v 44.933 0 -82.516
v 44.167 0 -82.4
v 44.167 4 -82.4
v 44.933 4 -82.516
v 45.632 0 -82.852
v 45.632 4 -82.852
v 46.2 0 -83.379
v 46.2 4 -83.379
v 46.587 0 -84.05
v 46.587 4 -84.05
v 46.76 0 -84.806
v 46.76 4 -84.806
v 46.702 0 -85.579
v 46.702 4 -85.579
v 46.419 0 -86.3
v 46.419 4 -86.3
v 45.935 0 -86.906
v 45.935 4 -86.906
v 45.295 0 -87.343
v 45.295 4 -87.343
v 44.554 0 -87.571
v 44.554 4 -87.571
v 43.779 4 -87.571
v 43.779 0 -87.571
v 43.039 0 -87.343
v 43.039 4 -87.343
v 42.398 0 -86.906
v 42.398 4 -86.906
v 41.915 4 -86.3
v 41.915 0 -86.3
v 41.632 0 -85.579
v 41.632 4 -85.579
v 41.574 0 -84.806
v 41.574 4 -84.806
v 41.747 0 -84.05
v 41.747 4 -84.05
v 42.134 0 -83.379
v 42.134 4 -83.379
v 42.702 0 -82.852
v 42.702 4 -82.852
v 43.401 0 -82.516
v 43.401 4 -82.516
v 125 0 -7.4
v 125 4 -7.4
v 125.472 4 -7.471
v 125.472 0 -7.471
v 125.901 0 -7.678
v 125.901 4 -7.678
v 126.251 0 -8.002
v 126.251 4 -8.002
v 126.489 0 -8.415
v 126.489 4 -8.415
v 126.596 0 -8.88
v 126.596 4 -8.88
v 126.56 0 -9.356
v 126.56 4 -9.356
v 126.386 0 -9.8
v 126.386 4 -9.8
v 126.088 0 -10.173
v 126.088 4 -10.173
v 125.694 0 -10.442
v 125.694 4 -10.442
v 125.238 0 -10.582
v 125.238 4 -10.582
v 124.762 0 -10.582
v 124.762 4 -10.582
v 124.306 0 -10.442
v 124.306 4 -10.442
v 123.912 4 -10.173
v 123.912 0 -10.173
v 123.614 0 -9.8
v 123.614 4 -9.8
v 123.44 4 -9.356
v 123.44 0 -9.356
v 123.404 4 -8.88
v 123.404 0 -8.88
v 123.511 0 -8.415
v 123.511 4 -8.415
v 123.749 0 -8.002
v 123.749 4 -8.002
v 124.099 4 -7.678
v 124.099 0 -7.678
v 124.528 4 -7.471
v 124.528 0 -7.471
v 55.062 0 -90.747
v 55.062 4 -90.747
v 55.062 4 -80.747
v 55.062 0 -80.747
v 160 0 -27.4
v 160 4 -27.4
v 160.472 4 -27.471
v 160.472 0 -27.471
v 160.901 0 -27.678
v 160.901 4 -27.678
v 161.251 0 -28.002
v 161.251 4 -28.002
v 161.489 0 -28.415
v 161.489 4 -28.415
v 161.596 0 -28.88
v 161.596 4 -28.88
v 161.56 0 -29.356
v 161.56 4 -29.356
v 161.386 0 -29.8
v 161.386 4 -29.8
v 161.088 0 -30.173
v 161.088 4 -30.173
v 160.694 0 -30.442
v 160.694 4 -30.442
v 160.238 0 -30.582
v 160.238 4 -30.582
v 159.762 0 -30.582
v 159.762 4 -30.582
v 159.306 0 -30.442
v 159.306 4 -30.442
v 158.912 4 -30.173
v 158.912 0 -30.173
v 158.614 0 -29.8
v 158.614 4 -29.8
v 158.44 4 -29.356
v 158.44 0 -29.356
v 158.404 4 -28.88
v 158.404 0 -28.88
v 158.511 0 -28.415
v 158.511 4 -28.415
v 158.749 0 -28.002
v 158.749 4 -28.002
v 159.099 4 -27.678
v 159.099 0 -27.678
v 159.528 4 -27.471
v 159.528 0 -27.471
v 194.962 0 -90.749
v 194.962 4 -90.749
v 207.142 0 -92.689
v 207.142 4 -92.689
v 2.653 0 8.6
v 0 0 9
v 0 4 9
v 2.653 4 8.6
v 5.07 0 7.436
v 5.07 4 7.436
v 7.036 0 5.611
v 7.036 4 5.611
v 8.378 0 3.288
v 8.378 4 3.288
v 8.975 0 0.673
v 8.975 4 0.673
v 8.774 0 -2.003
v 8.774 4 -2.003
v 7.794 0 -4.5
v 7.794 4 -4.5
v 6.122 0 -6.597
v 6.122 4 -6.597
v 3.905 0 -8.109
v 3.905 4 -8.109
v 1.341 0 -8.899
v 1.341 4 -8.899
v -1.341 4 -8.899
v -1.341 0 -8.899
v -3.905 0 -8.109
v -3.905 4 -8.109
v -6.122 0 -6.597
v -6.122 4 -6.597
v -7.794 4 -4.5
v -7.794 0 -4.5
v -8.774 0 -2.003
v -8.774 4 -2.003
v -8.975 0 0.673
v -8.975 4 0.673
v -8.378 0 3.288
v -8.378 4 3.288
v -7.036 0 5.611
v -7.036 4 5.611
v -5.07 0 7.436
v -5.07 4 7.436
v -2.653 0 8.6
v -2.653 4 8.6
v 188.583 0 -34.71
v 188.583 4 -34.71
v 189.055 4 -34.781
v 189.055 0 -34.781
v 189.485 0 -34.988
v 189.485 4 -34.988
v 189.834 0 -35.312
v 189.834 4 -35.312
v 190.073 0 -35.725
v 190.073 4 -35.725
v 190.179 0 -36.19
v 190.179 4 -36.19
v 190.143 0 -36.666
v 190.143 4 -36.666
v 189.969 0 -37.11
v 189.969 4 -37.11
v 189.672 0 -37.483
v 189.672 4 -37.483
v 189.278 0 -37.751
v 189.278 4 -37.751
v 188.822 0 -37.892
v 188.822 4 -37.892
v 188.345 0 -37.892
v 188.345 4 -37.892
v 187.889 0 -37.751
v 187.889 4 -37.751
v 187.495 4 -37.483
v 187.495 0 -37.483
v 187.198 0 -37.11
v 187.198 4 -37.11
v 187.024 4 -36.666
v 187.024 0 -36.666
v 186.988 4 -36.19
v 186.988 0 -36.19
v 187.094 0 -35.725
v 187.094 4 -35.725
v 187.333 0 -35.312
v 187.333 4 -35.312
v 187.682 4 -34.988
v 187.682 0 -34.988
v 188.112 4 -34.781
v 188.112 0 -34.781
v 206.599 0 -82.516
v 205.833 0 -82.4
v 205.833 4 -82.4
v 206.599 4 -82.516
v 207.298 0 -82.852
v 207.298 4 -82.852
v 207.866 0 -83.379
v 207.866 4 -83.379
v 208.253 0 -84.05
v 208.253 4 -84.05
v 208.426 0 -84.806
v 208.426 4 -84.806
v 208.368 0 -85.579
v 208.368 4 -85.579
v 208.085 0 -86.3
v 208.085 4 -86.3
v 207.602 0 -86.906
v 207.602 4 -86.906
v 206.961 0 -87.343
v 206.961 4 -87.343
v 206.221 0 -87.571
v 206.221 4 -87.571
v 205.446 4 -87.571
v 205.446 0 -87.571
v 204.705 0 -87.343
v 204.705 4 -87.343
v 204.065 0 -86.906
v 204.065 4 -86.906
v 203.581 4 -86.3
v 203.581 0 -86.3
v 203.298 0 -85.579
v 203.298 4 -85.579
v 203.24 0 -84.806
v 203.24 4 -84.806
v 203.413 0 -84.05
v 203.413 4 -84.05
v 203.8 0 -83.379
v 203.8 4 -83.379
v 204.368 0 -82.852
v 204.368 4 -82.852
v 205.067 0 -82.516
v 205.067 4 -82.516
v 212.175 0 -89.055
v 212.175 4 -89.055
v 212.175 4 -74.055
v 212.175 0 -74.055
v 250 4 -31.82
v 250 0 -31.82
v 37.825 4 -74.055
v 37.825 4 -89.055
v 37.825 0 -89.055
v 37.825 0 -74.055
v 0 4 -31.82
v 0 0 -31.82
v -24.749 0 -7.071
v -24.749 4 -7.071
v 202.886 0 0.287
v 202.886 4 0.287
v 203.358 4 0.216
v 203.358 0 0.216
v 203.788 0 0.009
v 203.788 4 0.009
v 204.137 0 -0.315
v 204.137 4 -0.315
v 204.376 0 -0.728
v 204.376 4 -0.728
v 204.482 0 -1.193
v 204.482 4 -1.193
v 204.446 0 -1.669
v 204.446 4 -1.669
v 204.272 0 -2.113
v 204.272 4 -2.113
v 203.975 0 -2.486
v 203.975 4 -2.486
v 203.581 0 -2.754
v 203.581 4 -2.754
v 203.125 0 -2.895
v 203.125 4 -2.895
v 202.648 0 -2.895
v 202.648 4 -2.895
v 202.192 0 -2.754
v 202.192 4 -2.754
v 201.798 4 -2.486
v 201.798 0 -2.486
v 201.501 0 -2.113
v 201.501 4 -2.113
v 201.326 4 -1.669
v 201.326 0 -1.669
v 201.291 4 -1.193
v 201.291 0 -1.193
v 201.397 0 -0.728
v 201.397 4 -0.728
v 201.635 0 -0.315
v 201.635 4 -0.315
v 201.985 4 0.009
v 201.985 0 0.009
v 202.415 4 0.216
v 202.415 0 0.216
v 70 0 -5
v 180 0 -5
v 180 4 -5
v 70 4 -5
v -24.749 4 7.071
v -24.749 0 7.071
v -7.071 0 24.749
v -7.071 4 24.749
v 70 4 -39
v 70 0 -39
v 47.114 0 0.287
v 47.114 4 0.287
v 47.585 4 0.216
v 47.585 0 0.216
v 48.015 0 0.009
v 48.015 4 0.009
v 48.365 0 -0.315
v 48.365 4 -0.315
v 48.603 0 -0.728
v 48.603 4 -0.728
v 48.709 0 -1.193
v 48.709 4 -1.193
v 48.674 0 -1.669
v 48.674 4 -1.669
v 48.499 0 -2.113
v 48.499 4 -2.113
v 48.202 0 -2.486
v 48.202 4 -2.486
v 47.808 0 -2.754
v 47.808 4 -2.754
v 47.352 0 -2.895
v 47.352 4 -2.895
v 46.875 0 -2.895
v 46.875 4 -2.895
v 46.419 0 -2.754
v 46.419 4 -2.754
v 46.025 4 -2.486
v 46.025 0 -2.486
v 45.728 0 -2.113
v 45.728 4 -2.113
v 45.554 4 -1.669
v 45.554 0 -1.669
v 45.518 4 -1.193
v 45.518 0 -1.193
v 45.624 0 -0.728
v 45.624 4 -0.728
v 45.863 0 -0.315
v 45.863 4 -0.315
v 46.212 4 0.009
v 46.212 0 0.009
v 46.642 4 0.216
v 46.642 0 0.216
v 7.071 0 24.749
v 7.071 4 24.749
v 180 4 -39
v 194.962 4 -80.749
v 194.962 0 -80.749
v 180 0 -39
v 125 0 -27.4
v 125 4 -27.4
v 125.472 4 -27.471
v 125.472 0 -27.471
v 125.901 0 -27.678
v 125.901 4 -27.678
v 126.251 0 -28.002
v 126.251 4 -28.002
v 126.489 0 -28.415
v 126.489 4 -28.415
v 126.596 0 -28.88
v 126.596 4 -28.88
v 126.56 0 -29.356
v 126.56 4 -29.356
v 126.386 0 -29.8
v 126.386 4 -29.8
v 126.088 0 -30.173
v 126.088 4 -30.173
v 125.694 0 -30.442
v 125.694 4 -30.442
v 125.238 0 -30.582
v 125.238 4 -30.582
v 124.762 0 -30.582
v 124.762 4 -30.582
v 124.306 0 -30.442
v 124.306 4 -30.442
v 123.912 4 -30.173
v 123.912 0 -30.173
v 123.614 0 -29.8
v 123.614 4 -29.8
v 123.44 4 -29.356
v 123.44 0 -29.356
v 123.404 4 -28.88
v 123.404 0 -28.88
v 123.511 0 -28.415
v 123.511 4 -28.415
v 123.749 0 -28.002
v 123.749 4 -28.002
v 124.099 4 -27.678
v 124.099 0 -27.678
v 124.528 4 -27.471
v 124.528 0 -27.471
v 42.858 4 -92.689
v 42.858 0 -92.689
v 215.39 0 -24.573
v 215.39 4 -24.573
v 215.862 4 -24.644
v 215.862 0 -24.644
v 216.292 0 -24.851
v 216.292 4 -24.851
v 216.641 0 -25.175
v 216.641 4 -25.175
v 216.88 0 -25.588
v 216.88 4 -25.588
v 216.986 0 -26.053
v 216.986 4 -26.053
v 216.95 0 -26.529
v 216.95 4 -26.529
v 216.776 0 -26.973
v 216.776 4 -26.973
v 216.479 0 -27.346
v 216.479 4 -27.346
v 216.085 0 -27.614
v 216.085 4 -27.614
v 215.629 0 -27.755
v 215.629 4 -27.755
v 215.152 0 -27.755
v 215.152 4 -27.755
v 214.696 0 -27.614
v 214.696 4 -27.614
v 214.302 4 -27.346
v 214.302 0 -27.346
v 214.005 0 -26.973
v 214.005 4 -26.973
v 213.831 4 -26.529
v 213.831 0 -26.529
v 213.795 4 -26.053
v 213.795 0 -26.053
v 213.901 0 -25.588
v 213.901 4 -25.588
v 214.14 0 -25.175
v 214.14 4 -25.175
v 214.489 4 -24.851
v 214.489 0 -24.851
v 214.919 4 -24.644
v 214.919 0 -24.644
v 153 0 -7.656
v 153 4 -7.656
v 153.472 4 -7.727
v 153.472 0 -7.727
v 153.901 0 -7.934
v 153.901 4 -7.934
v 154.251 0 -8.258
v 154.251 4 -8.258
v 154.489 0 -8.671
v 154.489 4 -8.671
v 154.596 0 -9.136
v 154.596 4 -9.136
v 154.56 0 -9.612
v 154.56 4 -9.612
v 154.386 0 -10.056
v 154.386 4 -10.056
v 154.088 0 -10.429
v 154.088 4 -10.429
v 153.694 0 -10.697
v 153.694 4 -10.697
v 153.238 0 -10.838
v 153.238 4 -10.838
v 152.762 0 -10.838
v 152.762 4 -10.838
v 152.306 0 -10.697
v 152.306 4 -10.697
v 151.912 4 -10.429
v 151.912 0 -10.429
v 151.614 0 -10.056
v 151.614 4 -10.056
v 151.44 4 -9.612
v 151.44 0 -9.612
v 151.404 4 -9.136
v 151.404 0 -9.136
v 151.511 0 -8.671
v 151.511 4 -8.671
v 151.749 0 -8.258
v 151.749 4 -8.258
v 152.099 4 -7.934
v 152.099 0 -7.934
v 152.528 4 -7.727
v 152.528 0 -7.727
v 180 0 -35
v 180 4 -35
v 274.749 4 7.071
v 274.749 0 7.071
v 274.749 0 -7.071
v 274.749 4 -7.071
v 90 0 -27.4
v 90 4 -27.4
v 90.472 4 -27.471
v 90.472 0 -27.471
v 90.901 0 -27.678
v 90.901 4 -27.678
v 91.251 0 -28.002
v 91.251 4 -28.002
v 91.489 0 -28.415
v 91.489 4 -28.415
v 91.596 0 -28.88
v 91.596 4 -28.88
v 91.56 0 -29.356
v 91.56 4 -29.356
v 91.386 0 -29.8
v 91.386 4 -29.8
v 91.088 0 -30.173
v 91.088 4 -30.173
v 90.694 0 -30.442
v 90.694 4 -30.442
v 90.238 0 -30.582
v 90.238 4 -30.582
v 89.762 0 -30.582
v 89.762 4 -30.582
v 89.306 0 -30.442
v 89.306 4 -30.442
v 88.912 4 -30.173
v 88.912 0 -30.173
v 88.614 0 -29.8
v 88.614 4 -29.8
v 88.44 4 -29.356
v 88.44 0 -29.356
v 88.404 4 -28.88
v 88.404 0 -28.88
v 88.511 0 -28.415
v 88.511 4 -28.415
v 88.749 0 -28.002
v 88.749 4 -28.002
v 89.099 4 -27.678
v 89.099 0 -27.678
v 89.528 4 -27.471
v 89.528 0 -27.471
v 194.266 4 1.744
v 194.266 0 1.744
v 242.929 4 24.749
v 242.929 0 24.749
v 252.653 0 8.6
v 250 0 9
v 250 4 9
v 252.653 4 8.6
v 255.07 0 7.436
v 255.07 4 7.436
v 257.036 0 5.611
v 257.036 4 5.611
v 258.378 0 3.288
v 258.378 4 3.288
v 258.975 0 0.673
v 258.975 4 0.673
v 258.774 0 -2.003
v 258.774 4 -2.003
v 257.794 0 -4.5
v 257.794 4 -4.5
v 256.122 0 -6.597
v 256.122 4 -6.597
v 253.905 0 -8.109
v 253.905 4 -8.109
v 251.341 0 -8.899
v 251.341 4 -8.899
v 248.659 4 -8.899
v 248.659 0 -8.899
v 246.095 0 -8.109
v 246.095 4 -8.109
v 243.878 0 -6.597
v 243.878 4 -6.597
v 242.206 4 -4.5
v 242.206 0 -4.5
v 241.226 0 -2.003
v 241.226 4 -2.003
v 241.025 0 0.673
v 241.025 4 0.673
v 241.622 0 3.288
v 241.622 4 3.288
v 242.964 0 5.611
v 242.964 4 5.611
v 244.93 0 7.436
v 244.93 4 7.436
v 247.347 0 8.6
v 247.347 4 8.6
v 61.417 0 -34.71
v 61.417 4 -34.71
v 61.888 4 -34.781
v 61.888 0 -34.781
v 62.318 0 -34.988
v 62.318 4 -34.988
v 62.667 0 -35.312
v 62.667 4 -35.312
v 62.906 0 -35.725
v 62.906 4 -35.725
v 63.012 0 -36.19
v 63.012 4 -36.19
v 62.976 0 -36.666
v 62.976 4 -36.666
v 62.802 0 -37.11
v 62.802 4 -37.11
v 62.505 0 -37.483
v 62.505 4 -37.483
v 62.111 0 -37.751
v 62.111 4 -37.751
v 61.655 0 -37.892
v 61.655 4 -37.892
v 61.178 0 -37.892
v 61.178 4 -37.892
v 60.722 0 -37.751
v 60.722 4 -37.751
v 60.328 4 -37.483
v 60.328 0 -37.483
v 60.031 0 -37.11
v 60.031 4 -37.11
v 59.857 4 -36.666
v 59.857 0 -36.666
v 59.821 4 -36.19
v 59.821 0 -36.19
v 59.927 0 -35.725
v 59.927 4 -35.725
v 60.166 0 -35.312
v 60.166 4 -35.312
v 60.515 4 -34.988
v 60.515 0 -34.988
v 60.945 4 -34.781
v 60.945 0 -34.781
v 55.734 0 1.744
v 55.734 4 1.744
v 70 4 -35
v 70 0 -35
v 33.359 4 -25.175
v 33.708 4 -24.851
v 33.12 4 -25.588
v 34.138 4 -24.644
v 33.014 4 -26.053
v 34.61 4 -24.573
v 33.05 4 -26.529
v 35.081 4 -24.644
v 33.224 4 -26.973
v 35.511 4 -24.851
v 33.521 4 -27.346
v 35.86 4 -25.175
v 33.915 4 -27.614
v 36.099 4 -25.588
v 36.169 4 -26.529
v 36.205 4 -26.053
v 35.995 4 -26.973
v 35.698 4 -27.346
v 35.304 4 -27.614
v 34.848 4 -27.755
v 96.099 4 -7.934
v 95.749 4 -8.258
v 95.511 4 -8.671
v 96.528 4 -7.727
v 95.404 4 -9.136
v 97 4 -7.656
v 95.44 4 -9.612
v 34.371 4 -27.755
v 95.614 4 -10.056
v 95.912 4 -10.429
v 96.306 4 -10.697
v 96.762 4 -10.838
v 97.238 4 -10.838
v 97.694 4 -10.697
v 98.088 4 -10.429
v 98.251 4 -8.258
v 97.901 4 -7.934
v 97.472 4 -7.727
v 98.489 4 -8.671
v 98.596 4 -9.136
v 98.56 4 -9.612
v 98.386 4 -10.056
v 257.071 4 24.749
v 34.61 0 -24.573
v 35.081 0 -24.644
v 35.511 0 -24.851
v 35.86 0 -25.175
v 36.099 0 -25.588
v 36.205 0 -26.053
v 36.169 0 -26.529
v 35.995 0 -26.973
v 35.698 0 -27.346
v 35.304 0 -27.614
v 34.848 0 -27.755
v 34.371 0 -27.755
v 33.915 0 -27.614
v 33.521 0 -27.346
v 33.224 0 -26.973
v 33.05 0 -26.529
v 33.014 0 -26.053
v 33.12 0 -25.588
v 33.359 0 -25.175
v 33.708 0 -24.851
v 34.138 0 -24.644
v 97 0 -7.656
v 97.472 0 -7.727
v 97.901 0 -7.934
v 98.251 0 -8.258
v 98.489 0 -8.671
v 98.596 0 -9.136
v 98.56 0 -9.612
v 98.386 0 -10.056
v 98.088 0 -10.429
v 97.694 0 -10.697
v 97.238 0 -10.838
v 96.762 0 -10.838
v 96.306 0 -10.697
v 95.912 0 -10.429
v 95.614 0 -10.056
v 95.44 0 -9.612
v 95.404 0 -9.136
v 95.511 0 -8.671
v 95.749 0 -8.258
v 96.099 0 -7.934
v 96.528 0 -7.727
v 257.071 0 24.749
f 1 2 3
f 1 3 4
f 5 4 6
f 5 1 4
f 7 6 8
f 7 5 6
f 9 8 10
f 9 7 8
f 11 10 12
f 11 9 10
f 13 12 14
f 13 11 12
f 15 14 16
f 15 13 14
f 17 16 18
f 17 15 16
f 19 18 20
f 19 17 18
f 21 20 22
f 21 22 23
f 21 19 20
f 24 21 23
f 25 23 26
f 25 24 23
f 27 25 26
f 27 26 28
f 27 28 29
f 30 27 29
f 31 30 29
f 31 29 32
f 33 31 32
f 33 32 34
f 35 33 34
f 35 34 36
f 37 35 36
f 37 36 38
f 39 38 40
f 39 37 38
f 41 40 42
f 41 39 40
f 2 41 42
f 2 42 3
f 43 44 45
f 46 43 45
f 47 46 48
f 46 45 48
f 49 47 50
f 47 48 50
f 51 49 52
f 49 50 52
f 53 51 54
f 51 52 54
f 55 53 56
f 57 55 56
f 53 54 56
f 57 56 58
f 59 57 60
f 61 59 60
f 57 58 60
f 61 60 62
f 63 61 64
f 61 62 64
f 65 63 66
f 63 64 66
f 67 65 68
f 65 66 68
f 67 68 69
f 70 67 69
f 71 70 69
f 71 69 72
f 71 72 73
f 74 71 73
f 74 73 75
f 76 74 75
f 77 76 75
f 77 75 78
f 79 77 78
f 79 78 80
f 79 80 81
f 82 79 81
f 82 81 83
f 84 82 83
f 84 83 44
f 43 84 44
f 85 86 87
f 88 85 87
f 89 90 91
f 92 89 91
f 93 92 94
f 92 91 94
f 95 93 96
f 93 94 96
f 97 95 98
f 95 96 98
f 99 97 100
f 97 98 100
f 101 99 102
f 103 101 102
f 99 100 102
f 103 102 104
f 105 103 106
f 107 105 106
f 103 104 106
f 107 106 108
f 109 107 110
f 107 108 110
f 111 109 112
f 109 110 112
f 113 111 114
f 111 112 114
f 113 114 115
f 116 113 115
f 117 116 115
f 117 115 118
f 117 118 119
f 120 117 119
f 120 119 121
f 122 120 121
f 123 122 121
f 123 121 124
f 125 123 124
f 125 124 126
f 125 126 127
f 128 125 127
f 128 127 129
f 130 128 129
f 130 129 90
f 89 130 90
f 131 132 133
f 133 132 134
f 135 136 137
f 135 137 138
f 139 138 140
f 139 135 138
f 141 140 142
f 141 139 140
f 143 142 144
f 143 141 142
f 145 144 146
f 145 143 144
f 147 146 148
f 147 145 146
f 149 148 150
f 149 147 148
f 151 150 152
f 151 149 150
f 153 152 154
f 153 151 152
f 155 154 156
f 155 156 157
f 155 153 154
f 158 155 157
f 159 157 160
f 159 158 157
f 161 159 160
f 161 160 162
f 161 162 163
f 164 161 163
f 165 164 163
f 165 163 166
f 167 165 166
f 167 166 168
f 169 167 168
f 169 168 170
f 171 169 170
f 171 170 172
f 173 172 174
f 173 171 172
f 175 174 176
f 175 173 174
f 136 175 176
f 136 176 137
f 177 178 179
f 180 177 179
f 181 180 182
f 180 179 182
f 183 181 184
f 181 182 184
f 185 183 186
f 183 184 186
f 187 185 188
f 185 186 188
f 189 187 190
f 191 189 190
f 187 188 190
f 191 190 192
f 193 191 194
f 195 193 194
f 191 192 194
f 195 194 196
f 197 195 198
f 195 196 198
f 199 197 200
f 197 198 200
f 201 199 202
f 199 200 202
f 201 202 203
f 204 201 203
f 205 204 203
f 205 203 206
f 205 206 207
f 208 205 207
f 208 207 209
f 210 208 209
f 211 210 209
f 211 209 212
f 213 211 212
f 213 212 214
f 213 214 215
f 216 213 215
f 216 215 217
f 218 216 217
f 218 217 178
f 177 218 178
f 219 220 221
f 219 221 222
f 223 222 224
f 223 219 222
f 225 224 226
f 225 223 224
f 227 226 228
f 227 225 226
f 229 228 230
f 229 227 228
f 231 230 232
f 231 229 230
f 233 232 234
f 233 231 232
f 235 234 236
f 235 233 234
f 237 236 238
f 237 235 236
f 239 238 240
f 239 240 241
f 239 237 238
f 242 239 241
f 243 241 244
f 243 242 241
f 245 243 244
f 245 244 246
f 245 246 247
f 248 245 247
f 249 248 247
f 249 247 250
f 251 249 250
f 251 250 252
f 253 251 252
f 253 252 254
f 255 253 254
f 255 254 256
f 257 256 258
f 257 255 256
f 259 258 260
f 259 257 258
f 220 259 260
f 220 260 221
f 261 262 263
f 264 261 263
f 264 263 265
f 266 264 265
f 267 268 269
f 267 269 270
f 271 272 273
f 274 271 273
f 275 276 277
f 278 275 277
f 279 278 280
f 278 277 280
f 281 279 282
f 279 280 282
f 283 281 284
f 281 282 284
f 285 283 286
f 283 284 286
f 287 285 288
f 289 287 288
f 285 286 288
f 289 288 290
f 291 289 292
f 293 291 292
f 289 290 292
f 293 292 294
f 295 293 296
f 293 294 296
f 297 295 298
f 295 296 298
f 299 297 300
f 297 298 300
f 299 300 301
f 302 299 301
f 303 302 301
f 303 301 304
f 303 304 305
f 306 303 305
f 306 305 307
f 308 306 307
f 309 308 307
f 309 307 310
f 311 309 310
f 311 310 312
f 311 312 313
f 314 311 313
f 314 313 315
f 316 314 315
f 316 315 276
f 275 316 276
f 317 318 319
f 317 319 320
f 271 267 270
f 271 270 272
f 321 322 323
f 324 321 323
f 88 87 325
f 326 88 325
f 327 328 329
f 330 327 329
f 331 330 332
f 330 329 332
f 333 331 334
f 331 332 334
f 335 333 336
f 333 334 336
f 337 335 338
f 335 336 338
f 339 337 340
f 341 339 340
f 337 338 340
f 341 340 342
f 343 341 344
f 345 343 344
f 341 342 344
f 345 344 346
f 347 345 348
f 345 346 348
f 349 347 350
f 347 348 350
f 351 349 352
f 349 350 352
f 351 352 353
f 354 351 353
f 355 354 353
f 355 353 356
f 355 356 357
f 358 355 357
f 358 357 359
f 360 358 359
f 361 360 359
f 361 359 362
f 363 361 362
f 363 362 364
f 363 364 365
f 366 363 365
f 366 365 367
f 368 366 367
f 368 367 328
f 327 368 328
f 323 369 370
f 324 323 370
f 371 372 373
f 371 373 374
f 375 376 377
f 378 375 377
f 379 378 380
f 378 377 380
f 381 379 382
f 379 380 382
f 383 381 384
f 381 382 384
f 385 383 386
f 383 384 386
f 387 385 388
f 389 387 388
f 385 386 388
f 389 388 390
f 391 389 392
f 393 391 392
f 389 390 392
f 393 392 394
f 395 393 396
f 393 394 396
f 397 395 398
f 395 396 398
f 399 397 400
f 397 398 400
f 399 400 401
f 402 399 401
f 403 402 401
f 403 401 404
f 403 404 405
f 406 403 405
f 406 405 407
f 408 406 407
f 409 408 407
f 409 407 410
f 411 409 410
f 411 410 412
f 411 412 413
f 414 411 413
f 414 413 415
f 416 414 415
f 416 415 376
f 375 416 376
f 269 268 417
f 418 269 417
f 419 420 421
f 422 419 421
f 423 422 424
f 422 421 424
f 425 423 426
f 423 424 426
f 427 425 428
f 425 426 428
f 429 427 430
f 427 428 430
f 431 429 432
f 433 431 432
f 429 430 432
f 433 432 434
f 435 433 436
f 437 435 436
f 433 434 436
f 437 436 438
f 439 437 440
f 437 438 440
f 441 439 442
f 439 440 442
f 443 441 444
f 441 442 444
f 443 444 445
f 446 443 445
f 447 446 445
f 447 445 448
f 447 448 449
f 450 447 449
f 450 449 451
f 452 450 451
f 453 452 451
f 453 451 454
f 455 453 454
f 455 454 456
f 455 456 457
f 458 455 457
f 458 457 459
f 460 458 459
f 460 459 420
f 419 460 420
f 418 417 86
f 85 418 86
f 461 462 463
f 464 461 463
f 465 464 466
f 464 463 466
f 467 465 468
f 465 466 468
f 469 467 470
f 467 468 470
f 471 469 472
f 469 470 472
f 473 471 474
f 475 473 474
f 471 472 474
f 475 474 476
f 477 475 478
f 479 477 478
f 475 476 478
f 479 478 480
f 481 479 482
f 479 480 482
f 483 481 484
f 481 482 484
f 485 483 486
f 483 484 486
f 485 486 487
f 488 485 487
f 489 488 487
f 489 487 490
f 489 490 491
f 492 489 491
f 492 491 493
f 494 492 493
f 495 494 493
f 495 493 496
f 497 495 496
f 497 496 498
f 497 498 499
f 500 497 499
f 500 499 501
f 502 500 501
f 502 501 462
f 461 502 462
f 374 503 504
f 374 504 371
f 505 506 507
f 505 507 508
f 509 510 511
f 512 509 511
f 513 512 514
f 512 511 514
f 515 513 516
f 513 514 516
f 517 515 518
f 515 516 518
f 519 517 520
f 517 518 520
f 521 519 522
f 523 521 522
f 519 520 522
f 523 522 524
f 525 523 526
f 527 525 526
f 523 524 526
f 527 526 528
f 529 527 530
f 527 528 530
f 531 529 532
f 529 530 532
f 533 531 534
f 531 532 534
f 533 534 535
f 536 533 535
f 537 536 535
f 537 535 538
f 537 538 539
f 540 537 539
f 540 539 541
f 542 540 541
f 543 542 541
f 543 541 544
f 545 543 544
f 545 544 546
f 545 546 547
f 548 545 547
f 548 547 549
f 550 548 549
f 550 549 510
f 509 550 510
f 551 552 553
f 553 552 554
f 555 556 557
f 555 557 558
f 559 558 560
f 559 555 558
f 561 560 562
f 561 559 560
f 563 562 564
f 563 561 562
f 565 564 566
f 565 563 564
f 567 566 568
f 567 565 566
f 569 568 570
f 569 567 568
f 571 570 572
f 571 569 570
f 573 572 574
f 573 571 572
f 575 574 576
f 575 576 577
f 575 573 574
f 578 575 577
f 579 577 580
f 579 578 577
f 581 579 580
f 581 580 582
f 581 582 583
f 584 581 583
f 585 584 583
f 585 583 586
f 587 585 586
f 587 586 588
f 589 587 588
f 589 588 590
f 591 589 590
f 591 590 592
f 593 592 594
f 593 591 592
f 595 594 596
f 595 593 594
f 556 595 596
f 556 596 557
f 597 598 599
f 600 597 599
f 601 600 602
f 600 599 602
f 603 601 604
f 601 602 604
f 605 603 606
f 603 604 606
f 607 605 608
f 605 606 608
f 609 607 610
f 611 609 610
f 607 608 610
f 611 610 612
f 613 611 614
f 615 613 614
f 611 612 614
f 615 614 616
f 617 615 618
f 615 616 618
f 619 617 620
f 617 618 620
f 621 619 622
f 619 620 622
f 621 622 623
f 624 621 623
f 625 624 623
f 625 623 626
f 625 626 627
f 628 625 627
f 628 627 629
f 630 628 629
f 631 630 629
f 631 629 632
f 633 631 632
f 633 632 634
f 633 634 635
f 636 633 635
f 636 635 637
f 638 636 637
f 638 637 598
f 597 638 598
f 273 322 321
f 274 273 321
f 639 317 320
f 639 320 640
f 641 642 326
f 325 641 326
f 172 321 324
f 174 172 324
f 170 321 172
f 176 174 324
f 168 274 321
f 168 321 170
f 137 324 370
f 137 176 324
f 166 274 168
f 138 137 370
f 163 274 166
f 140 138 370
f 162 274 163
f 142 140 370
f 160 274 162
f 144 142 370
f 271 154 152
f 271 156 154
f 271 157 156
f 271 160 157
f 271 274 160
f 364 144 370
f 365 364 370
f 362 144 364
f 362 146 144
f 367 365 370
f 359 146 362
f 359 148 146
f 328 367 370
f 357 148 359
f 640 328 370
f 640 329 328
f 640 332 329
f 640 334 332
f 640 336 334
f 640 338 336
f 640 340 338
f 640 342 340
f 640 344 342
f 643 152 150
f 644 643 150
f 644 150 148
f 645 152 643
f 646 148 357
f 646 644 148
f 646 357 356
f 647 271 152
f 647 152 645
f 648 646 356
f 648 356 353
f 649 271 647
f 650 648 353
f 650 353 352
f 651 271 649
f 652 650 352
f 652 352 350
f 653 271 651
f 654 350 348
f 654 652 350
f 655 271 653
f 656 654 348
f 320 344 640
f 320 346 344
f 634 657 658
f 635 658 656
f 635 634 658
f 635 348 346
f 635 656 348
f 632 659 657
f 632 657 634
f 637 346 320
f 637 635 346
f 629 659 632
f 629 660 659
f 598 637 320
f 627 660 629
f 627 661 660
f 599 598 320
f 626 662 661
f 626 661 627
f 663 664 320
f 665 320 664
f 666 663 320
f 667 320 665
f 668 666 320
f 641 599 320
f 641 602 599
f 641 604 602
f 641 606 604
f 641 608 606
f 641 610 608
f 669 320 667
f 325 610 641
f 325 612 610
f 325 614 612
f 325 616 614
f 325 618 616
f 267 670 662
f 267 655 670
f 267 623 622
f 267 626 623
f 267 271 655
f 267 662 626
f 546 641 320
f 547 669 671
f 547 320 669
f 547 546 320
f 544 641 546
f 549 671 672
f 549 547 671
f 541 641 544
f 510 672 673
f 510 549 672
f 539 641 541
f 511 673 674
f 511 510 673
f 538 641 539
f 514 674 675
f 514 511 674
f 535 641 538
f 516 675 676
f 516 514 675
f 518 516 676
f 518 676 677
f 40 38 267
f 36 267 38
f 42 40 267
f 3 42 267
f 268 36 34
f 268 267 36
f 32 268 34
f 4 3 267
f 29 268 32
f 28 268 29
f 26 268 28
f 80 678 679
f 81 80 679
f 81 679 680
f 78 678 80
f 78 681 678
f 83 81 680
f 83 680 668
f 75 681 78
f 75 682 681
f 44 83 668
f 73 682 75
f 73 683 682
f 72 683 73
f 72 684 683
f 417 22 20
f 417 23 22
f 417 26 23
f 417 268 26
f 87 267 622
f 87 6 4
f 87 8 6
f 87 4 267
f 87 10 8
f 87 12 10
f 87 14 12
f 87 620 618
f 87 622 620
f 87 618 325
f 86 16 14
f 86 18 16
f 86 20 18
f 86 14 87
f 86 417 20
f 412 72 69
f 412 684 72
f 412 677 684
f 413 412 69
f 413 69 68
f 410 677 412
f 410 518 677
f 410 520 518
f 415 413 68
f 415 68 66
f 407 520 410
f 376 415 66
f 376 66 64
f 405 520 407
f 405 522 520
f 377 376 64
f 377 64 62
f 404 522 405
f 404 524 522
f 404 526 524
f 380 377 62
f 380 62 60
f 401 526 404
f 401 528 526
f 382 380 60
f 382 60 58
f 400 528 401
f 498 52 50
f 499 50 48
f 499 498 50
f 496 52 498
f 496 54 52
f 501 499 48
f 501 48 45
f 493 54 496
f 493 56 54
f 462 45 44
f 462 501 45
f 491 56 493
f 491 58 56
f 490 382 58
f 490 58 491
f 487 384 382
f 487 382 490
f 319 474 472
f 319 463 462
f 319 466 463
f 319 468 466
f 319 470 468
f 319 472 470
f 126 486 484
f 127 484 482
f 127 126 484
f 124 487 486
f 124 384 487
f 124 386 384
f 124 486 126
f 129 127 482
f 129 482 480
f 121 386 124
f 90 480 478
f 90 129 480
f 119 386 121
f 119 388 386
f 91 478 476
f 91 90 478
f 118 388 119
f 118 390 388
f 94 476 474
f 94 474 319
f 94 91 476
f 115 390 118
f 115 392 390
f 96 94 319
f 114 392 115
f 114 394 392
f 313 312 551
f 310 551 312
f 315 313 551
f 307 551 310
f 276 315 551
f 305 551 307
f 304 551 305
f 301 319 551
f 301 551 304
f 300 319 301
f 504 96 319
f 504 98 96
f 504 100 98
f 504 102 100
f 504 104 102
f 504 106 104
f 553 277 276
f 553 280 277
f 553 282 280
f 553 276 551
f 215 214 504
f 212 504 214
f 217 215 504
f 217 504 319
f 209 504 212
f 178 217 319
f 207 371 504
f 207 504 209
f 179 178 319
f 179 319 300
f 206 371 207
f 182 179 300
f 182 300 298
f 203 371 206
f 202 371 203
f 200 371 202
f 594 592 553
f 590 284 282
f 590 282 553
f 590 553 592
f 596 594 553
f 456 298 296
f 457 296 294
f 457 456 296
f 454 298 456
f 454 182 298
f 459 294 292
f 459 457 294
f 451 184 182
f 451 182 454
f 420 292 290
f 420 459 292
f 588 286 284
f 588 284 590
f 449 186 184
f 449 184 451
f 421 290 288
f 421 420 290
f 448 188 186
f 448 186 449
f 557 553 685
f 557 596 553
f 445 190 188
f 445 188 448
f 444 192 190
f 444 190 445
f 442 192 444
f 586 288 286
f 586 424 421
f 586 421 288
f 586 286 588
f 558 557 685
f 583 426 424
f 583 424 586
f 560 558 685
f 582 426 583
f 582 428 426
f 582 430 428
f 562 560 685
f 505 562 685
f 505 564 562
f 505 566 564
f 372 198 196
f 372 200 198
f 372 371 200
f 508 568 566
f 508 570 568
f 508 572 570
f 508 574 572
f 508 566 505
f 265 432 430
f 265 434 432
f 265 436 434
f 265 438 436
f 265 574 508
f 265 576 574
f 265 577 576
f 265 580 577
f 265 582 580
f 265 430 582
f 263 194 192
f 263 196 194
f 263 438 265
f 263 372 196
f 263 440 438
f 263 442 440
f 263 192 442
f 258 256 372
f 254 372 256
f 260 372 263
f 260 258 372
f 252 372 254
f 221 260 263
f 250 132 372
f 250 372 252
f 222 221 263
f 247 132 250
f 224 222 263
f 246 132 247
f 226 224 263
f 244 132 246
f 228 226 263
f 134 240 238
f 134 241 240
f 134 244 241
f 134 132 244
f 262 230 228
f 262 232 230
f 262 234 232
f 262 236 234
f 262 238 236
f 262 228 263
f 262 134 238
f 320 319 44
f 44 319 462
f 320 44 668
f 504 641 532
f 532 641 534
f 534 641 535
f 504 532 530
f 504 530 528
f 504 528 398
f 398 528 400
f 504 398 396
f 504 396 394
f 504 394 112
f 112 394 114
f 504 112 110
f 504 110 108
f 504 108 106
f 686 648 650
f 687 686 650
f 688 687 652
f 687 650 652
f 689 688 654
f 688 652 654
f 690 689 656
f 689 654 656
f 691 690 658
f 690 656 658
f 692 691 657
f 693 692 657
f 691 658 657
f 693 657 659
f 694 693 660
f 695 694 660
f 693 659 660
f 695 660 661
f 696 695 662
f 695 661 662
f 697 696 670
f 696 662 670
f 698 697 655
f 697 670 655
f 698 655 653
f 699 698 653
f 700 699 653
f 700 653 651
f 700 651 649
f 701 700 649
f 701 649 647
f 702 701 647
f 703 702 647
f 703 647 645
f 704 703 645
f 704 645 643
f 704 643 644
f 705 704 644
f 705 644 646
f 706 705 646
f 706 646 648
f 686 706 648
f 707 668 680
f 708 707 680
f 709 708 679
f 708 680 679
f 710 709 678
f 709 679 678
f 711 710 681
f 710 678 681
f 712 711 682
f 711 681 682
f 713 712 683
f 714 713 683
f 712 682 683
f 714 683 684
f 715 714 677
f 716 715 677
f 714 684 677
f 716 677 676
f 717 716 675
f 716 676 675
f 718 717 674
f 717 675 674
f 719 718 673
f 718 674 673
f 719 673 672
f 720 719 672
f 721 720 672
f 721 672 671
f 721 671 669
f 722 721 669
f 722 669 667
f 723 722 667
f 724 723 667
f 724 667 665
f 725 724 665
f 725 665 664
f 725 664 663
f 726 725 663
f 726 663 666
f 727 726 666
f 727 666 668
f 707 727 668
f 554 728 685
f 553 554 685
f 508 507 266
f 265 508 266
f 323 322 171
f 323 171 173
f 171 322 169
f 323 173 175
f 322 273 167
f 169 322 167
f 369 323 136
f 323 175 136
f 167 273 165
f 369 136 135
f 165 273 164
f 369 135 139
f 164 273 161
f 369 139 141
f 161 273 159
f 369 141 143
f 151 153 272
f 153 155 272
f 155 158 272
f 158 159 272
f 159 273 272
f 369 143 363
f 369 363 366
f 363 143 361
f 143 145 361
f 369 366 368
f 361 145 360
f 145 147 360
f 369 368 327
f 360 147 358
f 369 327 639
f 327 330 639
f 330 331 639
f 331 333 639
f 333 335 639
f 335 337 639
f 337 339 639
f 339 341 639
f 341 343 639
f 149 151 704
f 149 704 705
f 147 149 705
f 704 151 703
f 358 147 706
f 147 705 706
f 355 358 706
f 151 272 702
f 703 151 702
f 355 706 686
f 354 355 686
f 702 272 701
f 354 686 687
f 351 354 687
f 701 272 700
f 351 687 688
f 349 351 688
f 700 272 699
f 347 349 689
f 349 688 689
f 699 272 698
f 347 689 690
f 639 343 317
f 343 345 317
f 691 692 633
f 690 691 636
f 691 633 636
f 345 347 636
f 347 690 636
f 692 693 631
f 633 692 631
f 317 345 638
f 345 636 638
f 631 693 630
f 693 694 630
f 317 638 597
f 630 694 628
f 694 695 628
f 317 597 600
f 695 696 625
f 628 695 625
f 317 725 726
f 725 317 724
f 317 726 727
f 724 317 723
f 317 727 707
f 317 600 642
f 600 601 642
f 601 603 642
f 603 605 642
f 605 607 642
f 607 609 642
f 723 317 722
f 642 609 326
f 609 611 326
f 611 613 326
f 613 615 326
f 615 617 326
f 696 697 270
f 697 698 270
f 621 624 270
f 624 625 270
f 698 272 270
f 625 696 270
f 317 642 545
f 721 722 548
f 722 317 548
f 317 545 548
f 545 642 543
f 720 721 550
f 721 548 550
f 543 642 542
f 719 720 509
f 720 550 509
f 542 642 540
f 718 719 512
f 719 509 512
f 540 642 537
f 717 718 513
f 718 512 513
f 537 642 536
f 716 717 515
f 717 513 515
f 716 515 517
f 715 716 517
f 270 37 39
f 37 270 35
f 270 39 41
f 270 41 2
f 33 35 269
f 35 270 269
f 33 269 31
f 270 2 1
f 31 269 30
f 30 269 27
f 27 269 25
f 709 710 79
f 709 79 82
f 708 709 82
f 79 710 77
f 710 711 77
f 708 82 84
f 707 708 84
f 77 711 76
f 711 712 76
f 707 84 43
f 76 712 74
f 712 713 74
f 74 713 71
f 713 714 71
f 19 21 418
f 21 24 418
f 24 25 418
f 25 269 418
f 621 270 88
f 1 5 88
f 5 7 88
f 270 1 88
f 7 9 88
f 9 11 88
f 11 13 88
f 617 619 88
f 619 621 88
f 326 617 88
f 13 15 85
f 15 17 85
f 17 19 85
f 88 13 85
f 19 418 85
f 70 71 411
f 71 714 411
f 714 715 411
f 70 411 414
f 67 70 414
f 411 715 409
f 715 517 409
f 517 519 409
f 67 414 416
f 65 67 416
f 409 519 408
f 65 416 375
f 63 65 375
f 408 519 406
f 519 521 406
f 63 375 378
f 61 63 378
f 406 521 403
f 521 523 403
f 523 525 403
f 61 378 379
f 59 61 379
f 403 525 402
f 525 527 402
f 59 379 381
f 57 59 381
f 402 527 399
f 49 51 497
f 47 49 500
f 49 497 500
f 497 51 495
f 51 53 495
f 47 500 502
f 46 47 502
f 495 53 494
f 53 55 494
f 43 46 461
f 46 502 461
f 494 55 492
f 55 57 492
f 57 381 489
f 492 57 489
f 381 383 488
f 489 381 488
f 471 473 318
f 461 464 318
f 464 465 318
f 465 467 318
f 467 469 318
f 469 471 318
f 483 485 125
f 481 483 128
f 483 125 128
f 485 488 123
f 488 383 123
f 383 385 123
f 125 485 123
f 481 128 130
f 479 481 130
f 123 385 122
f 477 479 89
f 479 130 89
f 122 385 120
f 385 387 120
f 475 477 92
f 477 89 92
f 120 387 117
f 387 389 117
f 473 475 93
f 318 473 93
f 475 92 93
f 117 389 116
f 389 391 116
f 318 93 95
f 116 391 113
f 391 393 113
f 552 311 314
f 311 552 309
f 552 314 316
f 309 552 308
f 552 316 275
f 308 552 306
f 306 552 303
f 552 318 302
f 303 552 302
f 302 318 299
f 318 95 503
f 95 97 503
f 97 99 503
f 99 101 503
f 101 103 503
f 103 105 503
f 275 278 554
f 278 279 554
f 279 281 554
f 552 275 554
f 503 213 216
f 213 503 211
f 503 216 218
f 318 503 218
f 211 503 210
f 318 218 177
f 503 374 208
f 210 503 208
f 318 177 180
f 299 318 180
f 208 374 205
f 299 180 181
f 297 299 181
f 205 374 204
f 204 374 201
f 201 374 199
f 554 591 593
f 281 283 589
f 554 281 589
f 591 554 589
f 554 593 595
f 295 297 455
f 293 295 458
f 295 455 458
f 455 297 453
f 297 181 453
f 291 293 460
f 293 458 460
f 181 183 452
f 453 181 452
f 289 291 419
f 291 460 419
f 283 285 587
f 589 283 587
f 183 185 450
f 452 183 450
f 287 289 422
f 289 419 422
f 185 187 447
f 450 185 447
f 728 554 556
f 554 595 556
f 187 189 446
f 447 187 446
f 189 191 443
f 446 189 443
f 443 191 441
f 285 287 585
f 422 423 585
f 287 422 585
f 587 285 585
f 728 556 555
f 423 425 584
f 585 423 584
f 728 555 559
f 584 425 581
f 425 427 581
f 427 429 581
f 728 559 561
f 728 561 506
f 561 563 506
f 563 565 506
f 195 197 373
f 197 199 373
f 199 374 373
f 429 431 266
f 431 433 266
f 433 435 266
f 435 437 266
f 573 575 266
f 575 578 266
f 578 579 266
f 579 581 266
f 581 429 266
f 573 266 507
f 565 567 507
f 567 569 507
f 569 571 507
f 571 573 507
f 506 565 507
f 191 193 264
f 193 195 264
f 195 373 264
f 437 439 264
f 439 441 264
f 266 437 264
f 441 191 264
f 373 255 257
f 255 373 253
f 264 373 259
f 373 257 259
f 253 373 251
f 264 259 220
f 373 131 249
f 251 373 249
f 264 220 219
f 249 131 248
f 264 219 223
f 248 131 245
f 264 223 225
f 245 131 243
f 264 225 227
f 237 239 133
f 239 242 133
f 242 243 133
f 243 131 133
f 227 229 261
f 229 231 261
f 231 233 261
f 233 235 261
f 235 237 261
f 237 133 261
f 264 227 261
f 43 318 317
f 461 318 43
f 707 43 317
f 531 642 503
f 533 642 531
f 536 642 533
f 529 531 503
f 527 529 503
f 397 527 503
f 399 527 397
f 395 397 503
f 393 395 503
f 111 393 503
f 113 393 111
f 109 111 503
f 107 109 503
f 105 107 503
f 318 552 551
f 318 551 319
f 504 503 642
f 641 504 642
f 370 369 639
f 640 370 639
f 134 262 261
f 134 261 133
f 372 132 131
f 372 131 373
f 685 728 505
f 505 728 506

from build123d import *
from OCP.BRepFilletAPI import BRepFilletAPI_MakeChamfer

# Parameters (mm, degrees)
SKETCH_1_R          = 9
EXTRUDE_1_DEPTH     = 4
FILLET_3_R          = 50
CHAMFER_1_SIZE      = 10
FILLET_4_R          = 170
EXTRUDE_START       = -4
SKETCH_2_R          = 2.6
EXTRUDE_2_DEPTH     = 4
CHAMFER_2_SIZE      = 10
CHAMFER_2_SIZE2     = 10.024068518
FILLET_6_R          = 5
EXTRUDE_4_DEPTH     = 4
SKETCH_7_R          = 1.6
CUT_EXTRUDE_3_DEPTH = 10
CUT_EXTRUDE_4_DEPTH = 10
CUT_EXTRUDE_5_DEPTH = 10
EXTRUDE_6_DEPTH     = 4
EXTRUDE_7_DEPTH     = 4
CUT_EXTRUDE_START   = -4
CUT_EXTRUDE_6_DEPTH = 4
CUT_EXTRUDE_7_DEPTH = 10


with BuildPart() as part:
    # 草图1 → 凸台-拉伸1 (new body)
    with BuildSketch(Plane(origin=(0, 0, 0), x_dir=(1, 0, 0), z_dir=(0, 1, 0))):
        Polygon((5.303300859, 26.516504294), (0, 31.819805153), (-31.819805153, 0), (0, -31.819805153), (31.819805153, 0), (36.819805153, 5), (213.180194847, 5), (218.180194847, 0), (250, -31.819805153), (281.819805153, 0), (250, 31.819805153), (244.696699141, 26.516504294), (236.213203436, 35), (230, 35), (13.786796564, 35), align=None)
        with Locations(Location((0, 0, 0), (0, 0, 270))):
            Circle(SKETCH_1_R, mode=Mode.SUBTRACT)
        with Locations(Location((250, 0, 0), (0, 0, 270))):
            Circle(SKETCH_1_R, mode=Mode.SUBTRACT)
    extrude(amount=EXTRUDE_1_DEPTH)

    # 圆角3
    # the kernel refuses this fillet: 50 mm, written as the material it takes off along each edge
    with BuildSketch(Plane(origin=(236.213203436, -48.450245762, -35), x_dir=(-1, 0, 0), z_dir=(0, 1, 0))) as fillet_3_piece_1:
        with BuildLine():
            CenterArc((19.380098305, 50), FILLET_3_R, 236.132660747, 33.867339253)
            Line((-8.483495706, 8.483495706), (-9.040767586, 7.65316562))
            ThreePointArc((-9.040767586, 7.65316562), (-4.948854634, 3.534641072), (-0.707106781, -0.707106781))
            Line((-0.707106781, -0.707106781), (0, -1))
            Line((0, -1), (19.380098305, -1))
            Line((19.380098305, -1), (19.380098305, 0))
        make_face()
    extrude(amount=100.900491523, mode=Mode.SUBTRACT)
    with BuildSketch(Plane(origin=(13.786796564, -48.450245762, -35), x_dir=(1, 0, 0), z_dir=(0, 1, 0))) as fillet_3_piece_2:
        with BuildLine():
            CenterArc((19.380098305, -50), FILLET_3_R, 90, 33.867339253)
            Line((-8.483495706, -8.483495706), (-9.040767586, -7.65316562))
            ThreePointArc((-9.040767586, -7.65316562), (-4.948854634, -3.534641072), (-0.707106781, 0.707106781))
            Line((-0.707106781, 0.707106781), (0, 1))
            Line((0, 1), (19.380098305, 1))
            Line((19.380098305, 1), (19.380098305, 0))
        make_face()
    extrude(amount=100.900491523, mode=Mode.SUBTRACT)

    # 倒角1
    chamfer_1_edges = [part.edges().sort_by_distance(p)[0] for p in [
        (281.819805153, 2, 0),
        (250, 2, 31.819805153),
        (0, 2, 31.819805153),
        (-31.819805153, 2, 0),
    ]]
    chamfer(chamfer_1_edges, length=CHAMFER_1_SIZE)

    # 圆角4
    # the kernel refuses this fillet: 170 mm, written as the material it adds along each edge
    with BuildSketch(Plane(origin=(244.696699141, 0, -26.516504294), x_dir=(0.7071067811865487, 0, -0.7071067811865464), z_dir=(0, 1, 0))) as fillet_4_piece_1:
        with BuildLine():
            CenterArc((130.807104298, 117.027167913), FILLET_4_R, 215.157343004, 8.345858433)
            Line((-8.180446561, 19.137123955), (-10.960197579, 17.179323075))
            ThreePointArc((-10.960197579, 17.179323075), (-6.209829397, 8.662505006), (-3.336021383, -0.65647645))
            Line((-3.336021383, -0.65647645), (0, -3.4))
            ThreePointArc((0, -3.4), (3.75, -3.4), (5.033857914, -2.340543358))
            Line((5.033857914, -2.340543358), (7.5, 0))
        make_face()
    extrude(amount=4)
    with BuildSketch(Plane(origin=(5.303300859, 0, -26.516504294), x_dir=(-0.7071067811865499, 0, -0.707106781186545), z_dir=(0, 1, 0))) as fillet_4_piece_2:
        with BuildLine():
            CenterArc((130.807104298, -117.027167913), FILLET_4_R, 136.496798562, 8.345858433)
            Line((-8.180446561, -19.137123955), (-10.960197579, -17.179323075))
            ThreePointArc((-10.960197579, -17.179323075), (-6.209829397, -8.662505006), (-3.336021383, 0.65647645))
            Line((-3.336021383, 0.65647645), (0, 3.4))
            ThreePointArc((0, 3.4), (3.75, 3.4), (5.033857914, 2.340543358))
            Line((5.033857914, 2.340543358), (7.5, 0))
        make_face()
    extrude(amount=4)
    with BuildSketch(Plane(origin=(213.180194847, 0, -5), x_dir=(0.7071067811865461, 0, 0.707106781186549), z_dir=(0, 1, 0))) as fillet_4_piece_3:
        with BuildLine():
            CenterArc((73.311428823, -167.104876781), FILLET_4_R, 100.589244362, 34.410755638)
            Line((-46.896723979, -46.896723979), (-49.300887035, -44.492560923))
            Line((-49.300887035, -44.492560923), (-2.404163056, 2.404163056))
            Line((-2.404163056, 2.404163056), (0, 3.4))
            ThreePointArc((0, 3.4), (21.035533906, 3.4), (41.446260592, 3.342097536))
            Line((41.446260592, 3.342097536), (42.071067812, 0))
        make_face()
    extrude(amount=4)
    with BuildSketch(Plane(origin=(36.819805153, 0, -5), x_dir=(1, 0, 0), z_dir=(0, 1, 0))) as fillet_4_piece_4:
        with BuildLine():
            CenterArc((66.321983082, -170), FILLET_4_R, 90, 34.410755638)
            Line((-29.748737342, -29.748737342), (-31.67015175, -26.943712088))
            ThreePointArc((-31.67015175, -26.943712088), (-17.278531727, -12.470205615), (-2.404163056, 2.404163056))
            Line((-2.404163056, 2.404163056), (0, 3.4))
            Line((0, 3.4), (66.321983082, 3.4))
            Line((66.321983082, 3.4), (66.321983082, 0))
        make_face()
    extrude(amount=4)

    # 草图2 → 凸台-拉伸2 (add)
    # profile 1 of 2: a face of its own
    with BuildSketch(Plane(origin=(0, 4, 0), x_dir=(1, 0, 0), z_dir=(0, 1, 0)).offset(EXTRUDE_START)):
        with BuildLine():
            Line((33.166894869, 35), (70, 35))
            Line((70, 35), (70, 89.938046945))
            Line((70, 89.938046945), (52.173767708, 89.980797886))
            Line((52.173767708, 89.980797886), (45.293317142, 91.980771652))
            Line((45.293317142, 91.980771652), (41.239720179, 89.053596963))
            Line((41.239720179, 89.053596963), (37.186123217, 86.126422273))
            Line((37.186123217, 86.126422273), (34.934162449, 75.803316969))
            Line((34.934162449, 75.803316969), (0, 31.819805153))
            ThreePointArc((0, 31.819805153), (12.354394119, 32.593454654), (24.619740216, 34.264045178))
            ThreePointArc((24.619740216, 34.264045178), (28.877504407, 34.815671525), (33.166894869, 35))
        make_face()
        with Locations(Location((44.166894869, 85, 0), (0, 0, 270))):
            Circle(SKETCH_2_R, mode=Mode.SUBTRACT)
    # profile 2 of 2: a face of its own
    with BuildSketch(Plane(origin=(0, 4, 0), x_dir=(1, 0, 0), z_dir=(0, 1, 0)).offset(EXTRUDE_START)):
        with BuildLine():
            Line((180, 89.938046945), (197.826232292, 89.980797886))
            Line((197.826232292, 89.980797886), (204.706682858, 91.980771652))
            Line((204.706682858, 91.980771652), (208.760279821, 89.053596963))
            Line((208.760279821, 89.053596963), (212.813876783, 86.126422273))
            Line((212.813876783, 86.126422273), (215.065837551, 75.803316969))
            Line((215.065837551, 75.803316969), (250, 31.819805153))
            ThreePointArc((250, 31.819805153), (237.645605881, 32.593454654), (225.380259784, 34.264045178))
            ThreePointArc((225.380259784, 34.264045178), (221.122495593, 34.815671525), (216.833105131, 35))
            Line((216.833105131, 35), (180, 35))
            Line((180, 35), (180, 89.938046945))
        make_face()
        with Locations(Location((205.833105131, 85, 0), (0, 0, 270))):
            Circle(SKETCH_2_R, mode=Mode.SUBTRACT)
    extrude(amount=EXTRUDE_2_DEPTH)

    # 倒角2: one chamfer whose edges measure the first distance from different faces: ONE call of the kernel's chamfer builder (chamfer() names one face for all edges)
    chamfer_2_edges_1 = [part.edges().sort_by_distance(p)[0] for p in [
        (70, 2, -89.938046945),
    ]]
    chamfer_2_side_1 = [part.faces().sort_by_distance(p)[0] for p in [
        (61.086883854, 2, -89.959422415),
    ]]
    chamfer_2_edges_2 = [part.edges().sort_by_distance(p)[0] for p in [
        (180, 2, -89.938046945),
    ]]
    chamfer_2_side_2 = [part.faces().sort_by_distance(p)[0] for p in [
        (180, 2, -62.469023472),
    ]]
    chamfer_2 = BRepFilletAPI_MakeChamfer(part.part.solid().wrapped)
    for e in chamfer_2_edges_1:
        chamfer_2.Add(CHAMFER_2_SIZE, CHAMFER_2_SIZE2, e.wrapped, chamfer_2_side_1[0].wrapped)  # the first distance lies on this face
    for e in chamfer_2_edges_2:
        chamfer_2.Add(CHAMFER_2_SIZE, CHAMFER_2_SIZE2, e.wrapped, chamfer_2_side_2[0].wrapped)  # the first distance lies on this face
    add(Compound.cast(chamfer_2.Shape()), mode=Mode.REPLACE)

    # 圆角6
    fillet_6_edges = [part.edges().sort_by_distance(p)[0] for p in [
        (34.934162449, 2, -75.803316969),
        (52.173767708, 2, -89.980797886),
        (197.826232292, 2, -89.980797886),
    ]]
    fillet(fillet_6_edges, radius=FILLET_6_R)

    # 草图6 → 凸台-拉伸4 (add)
    with BuildSketch(Plane(origin=(0, 4, 0), x_dir=(1, 0, 0), z_dir=(0, 1, 0))):
        Polygon((37.186123217, 86.126422273), (37.824908007, 89.054644979), (42.857532511, 92.688792925), (45.293317142, 91.980771652), align=None)
        Polygon((212.175091993, 89.054644979), (207.142467489, 92.688792925), (204.706682858, 91.980771652), (212.813876783, 86.126422273), align=None)
    extrude(amount=-EXTRUDE_4_DEPTH)

    # 草图7 → 切除-拉伸3 (cut)
    with BuildSketch(Plane(origin=(0, 4, 0), x_dir=(1, 0, 0), z_dir=(0, 1, 0))):
        with Locations(Location((34.609562391, 26.172761135, 0), (0, 0, 270))):
            Circle(SKETCH_7_R)
        with Locations(Location((47.113684451, 1.312769582, 0), (0, 0, 270))):
            Circle(SKETCH_7_R)
        with Locations(Location((97, 9.255699158, 0), (0, 0, 270))):
            Circle(SKETCH_7_R)
        with Locations(Location((125, 29, 0), (0, 0, 270))):
            Circle(SKETCH_7_R)
        with Locations(Location((125, 9, 0), (0, 0, 270))):
            Circle(SKETCH_7_R)
        with Locations(Location((61.416561737, 36.309705645, 0), (0, 0, 270))):
            Circle(SKETCH_7_R)
        with Locations(Location((188.583438263, 36.309705645, 0), (0, 0, 270))):
            Circle(SKETCH_7_R)
        with Locations(Location((153, 9.255699158, 0), (0, 0, 270))):
            Circle(SKETCH_7_R)
        with Locations(Location((202.886315549, 1.312769582, 0), (0, 0, 270))):
            Circle(SKETCH_7_R)
        with Locations(Location((215.390437609, 26.172761135, 0), (0, 0, 270))):
            Circle(SKETCH_7_R)
        with Locations(Location((90, 29, 0), (0, 0, 270))):
            Circle(SKETCH_7_R)
        with Locations(Location((160, 29, 0), (0, 0, 270))):
            Circle(SKETCH_7_R)
    extrude(amount=-CUT_EXTRUDE_3_DEPTH, mode=Mode.SUBTRACT)

    # 草图8 → 切除-拉伸4 (cut)
    with BuildSketch(Plane(origin=(0, 4, 0), x_dir=(1, 0, 0), z_dir=(0, 1, 0))):
        with BuildLine():
            Line((37.824908007, 89.054644979), (0, 89.054644979))
            Line((0, 89.054644979), (0, 31.819805153))
            Line((0, 31.819805153), (34.211863658, 74.893913817))
            ThreePointArc((34.211863658, 74.893913817), (34.813909711, 75.860371791), (35.181686599, 76.937980545))
            Line((35.181686599, 76.937980545), (37.824908007, 89.054644979))
        make_face()
        with BuildLine():
            Line((37.824908007, 74.054644979), (0, 31.819805153))
            Line((0, 31.819805153), (34.211863658, 74.893913817))
            ThreePointArc((34.211863658, 74.893913817), (34.813909711, 75.860371791), (35.181686599, 76.937980545))
            Line((35.181686599, 76.937980545), (37.824908007, 89.054644979))
            Line((37.824908007, 89.054644979), (37.824908007, 74.054644979))
        make_face()
        Polygon((212.175091993, 89.054644979), (212.175091993, 74.054644979), (250, 31.819805153), (215.065837551, 75.803316969), align=None)
        Polygon((250, 89.054644979), (250, 31.819805153), (215.065837551, 75.803316969), (212.175091993, 89.054644979), align=None)
    extrude(amount=-CUT_EXTRUDE_4_DEPTH, mode=Mode.SUBTRACT)

    # 草图10 → 切除-拉伸5 (cut)
    with BuildSketch(Plane(origin=(0, 4, 0), x_dir=(1, 0, 0), z_dir=(0, 1, 0))):
        Polygon((60.000028757, 89.962028915), (70, 39), (70, 79.913978427), align=None)
        Polygon((190.024039692, 89.962086636), (180, 39), (180, 79.938046945), align=None)
    extrude(amount=-CUT_EXTRUDE_5_DEPTH, mode=Mode.SUBTRACT)

    # 草图11 → 凸台-拉伸6 (add)
    with BuildSketch(Plane(origin=(0, 4, 0), x_dir=(1, 0, 0), z_dir=(0, 1, 0))):
        Polygon((42.857532511, 92.688792925), (60.000028757, 89.962028915), (60.948179485, 85.13004654), align=None)
        Polygon((190.024039692, 89.962086636), (207.142467489, 92.688792925), (188.87547831, 84.122815598), align=None)
    extrude(amount=-EXTRUDE_6_DEPTH)

    # 草图12 → 凸台-拉伸7 (add)
    with BuildSketch(Plane(origin=(0, 4, 0), x_dir=(1, 0, 0), z_dir=(0, 1, 0)).offset(EXTRUDE_START)):
        with BuildLine():
            Line((7.071067812, -24.748737342), (55.733906645, -1.744088122))
            ThreePointArc((55.733906645, -1.744088122), (30.48622561, -11.308200545), (7.071067812, -24.748737342))
        make_face()
        with BuildLine():
            ThreePointArc((242.928932188, -24.748737342), (219.51377439, -11.308200545), (194.266093355, -1.744088122))
            Line((194.266093355, -1.744088122), (242.928932188, -24.748737342))
        make_face()
        with BuildLine():
            Line((188.394190901, 5), (180, 5))
            Line((180, 5), (194.266093355, -1.744088122))
            ThreePointArc((194.266093355, -1.744088122), (219.51377439, -11.308200545), (242.928932188, -24.748737342))
            Line((242.928932188, -24.748737342), (242.928932188, -20.020632947))
            Line((242.928932188, -20.020632947), (188.394190901, 5))
        make_face()
        with BuildLine():
            Line((55.733906645, -1.744088122), (70, 5))
            Line((70, 5), (63.353452333, 5))
            Line((63.353452333, 5), (4.835925233, -20.020632947))
            Line((4.835925233, -20.020632947), (7.071067812, -24.748737342))
            ThreePointArc((7.071067812, -24.748737342), (30.48622561, -11.308200545), (55.733906645, -1.744088122))
        make_face()
    extrude(amount=EXTRUDE_7_DEPTH)

    # 草图13 → 切除-拉伸6 (cut)
    with BuildSketch(Plane(origin=(0, 4, 0), x_dir=(1, 0, 0), z_dir=(0, 1, 0)).offset(CUT_EXTRUDE_START)):
        with BuildLine():
            ThreePointArc((55.733906645, -1.744088122), (79.199200857, 3.305533212), (103.141788235, 5))
            Line((103.141788235, 5), (70, 5))
            Line((70, 5), (55.733906645, -1.744088122))
        make_face()
        with BuildLine():
            Line((55.733906645, -1.744088122), (194.266093355, -1.744088122))
            ThreePointArc((194.266093355, -1.744088122), (170.800799143, 3.305533212), (146.858211765, 5))
            Line((146.858211765, 5), (103.141788235, 5))
            ThreePointArc((103.141788235, 5), (79.199200857, 3.305533212), (55.733906645, -1.744088122))
        make_face()
        with BuildLine():
            Line((180, 5), (146.858211765, 5))
            ThreePointArc((146.858211765, 5), (170.800799143, 3.305533212), (194.266093355, -1.744088122))
            Line((194.266093355, -1.744088122), (180, 5))
        make_face()
    extrude(amount=CUT_EXTRUDE_6_DEPTH, mode=Mode.SUBTRACT)

    # 草图14 → 切除-拉伸7 (cut)
    with BuildSketch(Plane(origin=(0, 4, 0), x_dir=(1, 0, 0), z_dir=(0, 1, 0))):
        Polygon((55.062107056, 90.747477369), (55.062107056, 80.747477369), (70, 39), (60.000028757, 89.962028915), align=None)
        Polygon((194.961792542, 90.748595883), (194.961792542, 80.748595883), (180, 39), (190.024039692, 89.962086636), align=None)
    extrude(amount=-CUT_EXTRUDE_7_DEPTH, mode=Mode.SUBTRACT)


solid = part.part
